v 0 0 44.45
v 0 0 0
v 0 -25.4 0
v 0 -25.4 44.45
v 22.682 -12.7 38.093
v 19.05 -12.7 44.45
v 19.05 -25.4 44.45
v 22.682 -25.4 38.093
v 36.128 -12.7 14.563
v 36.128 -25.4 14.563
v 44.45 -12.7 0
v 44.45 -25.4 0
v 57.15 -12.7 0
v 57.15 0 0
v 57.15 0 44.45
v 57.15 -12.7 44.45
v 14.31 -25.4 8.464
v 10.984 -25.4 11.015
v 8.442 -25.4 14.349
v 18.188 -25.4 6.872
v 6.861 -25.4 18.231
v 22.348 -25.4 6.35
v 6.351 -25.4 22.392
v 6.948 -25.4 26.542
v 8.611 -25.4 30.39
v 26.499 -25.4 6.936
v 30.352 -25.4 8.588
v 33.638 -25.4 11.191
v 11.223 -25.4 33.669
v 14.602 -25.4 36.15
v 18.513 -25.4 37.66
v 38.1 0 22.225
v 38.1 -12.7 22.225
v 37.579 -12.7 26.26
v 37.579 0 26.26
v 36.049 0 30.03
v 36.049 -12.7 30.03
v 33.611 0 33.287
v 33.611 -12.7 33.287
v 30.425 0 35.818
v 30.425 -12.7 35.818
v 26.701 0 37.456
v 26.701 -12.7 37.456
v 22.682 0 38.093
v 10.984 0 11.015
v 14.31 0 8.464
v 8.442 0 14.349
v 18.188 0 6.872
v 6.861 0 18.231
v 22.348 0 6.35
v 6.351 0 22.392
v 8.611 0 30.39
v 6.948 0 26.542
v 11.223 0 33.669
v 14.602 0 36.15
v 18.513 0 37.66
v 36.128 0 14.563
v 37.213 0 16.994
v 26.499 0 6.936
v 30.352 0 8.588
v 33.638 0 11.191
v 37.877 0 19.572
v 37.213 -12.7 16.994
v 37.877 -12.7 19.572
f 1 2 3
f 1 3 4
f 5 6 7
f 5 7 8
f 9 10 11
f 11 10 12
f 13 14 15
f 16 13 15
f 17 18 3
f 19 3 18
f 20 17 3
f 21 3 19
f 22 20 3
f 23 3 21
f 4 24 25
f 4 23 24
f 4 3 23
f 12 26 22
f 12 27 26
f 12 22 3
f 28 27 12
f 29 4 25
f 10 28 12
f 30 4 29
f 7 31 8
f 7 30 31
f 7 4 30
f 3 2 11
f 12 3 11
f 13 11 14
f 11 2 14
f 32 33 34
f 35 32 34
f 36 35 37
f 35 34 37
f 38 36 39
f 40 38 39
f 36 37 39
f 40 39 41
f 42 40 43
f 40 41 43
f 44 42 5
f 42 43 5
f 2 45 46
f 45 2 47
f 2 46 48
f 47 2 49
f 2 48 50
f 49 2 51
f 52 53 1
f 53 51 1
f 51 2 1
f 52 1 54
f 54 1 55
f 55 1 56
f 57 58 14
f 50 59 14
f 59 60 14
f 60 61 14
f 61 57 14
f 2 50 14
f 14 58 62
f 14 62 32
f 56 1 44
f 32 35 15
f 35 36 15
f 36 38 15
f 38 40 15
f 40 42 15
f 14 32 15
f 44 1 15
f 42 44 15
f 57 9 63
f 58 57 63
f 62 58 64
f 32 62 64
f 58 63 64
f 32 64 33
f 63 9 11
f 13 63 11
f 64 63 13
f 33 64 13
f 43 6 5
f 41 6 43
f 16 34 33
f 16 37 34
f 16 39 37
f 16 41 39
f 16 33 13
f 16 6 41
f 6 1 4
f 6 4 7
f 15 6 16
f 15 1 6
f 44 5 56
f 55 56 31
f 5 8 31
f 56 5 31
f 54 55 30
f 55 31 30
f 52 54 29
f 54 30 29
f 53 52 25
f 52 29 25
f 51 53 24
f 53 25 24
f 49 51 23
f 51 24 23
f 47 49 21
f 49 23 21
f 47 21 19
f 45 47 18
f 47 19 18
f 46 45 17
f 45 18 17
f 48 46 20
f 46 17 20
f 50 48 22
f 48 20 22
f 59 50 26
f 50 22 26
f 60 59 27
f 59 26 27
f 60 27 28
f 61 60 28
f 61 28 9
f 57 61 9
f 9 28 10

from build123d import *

# Parameters (mm, degrees)
F0_W     = 57.15
F0_H     = 44.45
F2_DEPTH = 25.4
F4_DEPTH = 12.7
F6_DEPTH = 25.4


with BuildPart() as f2:
    # F0 (on Front) → F2 (new body)
    with BuildSketch(Plane.XZ):
        with Locations((28.575, 22.225)):
            Rectangle(F0_W, F0_H)
    extrude(amount=F2_DEPTH)

    # F3 (on face) → F4 (cut)
    with BuildSketch(Plane.XZ.offset(25.4)):
        Polygon((19.05, 44.45), (44.45, 0), (57.15, 0), (57.15, 44.45), align=None)
    extrude(amount=-F4_DEPTH, mode=Mode.SUBTRACT)

    # F5 (on face) → F6 (cut)
    with BuildSketch(Plane.XZ.offset(25.4)):
        with BuildLine():
            ThreePointArc((36.128433, 14.562743), (37.599209, 18.269078), (38.1, 22.225))
            ThreePointArc((38.1, 22.225), (33.610865, 33.287446), (22.682337, 38.093411))
            Line((22.682337, 38.093411), (36.128433, 14.562743))
        make_face()
        with BuildLine():
            Line((36.128433, 14.562743), (22.682337, 38.093411))
            ThreePointArc((22.682337, 38.093411), (8.44164, 14.348794), (36.128433, 14.562743))
        make_face()
    extrude(amount=-F6_DEPTH, mode=Mode.SUBTRACT)


solid = f2.part
